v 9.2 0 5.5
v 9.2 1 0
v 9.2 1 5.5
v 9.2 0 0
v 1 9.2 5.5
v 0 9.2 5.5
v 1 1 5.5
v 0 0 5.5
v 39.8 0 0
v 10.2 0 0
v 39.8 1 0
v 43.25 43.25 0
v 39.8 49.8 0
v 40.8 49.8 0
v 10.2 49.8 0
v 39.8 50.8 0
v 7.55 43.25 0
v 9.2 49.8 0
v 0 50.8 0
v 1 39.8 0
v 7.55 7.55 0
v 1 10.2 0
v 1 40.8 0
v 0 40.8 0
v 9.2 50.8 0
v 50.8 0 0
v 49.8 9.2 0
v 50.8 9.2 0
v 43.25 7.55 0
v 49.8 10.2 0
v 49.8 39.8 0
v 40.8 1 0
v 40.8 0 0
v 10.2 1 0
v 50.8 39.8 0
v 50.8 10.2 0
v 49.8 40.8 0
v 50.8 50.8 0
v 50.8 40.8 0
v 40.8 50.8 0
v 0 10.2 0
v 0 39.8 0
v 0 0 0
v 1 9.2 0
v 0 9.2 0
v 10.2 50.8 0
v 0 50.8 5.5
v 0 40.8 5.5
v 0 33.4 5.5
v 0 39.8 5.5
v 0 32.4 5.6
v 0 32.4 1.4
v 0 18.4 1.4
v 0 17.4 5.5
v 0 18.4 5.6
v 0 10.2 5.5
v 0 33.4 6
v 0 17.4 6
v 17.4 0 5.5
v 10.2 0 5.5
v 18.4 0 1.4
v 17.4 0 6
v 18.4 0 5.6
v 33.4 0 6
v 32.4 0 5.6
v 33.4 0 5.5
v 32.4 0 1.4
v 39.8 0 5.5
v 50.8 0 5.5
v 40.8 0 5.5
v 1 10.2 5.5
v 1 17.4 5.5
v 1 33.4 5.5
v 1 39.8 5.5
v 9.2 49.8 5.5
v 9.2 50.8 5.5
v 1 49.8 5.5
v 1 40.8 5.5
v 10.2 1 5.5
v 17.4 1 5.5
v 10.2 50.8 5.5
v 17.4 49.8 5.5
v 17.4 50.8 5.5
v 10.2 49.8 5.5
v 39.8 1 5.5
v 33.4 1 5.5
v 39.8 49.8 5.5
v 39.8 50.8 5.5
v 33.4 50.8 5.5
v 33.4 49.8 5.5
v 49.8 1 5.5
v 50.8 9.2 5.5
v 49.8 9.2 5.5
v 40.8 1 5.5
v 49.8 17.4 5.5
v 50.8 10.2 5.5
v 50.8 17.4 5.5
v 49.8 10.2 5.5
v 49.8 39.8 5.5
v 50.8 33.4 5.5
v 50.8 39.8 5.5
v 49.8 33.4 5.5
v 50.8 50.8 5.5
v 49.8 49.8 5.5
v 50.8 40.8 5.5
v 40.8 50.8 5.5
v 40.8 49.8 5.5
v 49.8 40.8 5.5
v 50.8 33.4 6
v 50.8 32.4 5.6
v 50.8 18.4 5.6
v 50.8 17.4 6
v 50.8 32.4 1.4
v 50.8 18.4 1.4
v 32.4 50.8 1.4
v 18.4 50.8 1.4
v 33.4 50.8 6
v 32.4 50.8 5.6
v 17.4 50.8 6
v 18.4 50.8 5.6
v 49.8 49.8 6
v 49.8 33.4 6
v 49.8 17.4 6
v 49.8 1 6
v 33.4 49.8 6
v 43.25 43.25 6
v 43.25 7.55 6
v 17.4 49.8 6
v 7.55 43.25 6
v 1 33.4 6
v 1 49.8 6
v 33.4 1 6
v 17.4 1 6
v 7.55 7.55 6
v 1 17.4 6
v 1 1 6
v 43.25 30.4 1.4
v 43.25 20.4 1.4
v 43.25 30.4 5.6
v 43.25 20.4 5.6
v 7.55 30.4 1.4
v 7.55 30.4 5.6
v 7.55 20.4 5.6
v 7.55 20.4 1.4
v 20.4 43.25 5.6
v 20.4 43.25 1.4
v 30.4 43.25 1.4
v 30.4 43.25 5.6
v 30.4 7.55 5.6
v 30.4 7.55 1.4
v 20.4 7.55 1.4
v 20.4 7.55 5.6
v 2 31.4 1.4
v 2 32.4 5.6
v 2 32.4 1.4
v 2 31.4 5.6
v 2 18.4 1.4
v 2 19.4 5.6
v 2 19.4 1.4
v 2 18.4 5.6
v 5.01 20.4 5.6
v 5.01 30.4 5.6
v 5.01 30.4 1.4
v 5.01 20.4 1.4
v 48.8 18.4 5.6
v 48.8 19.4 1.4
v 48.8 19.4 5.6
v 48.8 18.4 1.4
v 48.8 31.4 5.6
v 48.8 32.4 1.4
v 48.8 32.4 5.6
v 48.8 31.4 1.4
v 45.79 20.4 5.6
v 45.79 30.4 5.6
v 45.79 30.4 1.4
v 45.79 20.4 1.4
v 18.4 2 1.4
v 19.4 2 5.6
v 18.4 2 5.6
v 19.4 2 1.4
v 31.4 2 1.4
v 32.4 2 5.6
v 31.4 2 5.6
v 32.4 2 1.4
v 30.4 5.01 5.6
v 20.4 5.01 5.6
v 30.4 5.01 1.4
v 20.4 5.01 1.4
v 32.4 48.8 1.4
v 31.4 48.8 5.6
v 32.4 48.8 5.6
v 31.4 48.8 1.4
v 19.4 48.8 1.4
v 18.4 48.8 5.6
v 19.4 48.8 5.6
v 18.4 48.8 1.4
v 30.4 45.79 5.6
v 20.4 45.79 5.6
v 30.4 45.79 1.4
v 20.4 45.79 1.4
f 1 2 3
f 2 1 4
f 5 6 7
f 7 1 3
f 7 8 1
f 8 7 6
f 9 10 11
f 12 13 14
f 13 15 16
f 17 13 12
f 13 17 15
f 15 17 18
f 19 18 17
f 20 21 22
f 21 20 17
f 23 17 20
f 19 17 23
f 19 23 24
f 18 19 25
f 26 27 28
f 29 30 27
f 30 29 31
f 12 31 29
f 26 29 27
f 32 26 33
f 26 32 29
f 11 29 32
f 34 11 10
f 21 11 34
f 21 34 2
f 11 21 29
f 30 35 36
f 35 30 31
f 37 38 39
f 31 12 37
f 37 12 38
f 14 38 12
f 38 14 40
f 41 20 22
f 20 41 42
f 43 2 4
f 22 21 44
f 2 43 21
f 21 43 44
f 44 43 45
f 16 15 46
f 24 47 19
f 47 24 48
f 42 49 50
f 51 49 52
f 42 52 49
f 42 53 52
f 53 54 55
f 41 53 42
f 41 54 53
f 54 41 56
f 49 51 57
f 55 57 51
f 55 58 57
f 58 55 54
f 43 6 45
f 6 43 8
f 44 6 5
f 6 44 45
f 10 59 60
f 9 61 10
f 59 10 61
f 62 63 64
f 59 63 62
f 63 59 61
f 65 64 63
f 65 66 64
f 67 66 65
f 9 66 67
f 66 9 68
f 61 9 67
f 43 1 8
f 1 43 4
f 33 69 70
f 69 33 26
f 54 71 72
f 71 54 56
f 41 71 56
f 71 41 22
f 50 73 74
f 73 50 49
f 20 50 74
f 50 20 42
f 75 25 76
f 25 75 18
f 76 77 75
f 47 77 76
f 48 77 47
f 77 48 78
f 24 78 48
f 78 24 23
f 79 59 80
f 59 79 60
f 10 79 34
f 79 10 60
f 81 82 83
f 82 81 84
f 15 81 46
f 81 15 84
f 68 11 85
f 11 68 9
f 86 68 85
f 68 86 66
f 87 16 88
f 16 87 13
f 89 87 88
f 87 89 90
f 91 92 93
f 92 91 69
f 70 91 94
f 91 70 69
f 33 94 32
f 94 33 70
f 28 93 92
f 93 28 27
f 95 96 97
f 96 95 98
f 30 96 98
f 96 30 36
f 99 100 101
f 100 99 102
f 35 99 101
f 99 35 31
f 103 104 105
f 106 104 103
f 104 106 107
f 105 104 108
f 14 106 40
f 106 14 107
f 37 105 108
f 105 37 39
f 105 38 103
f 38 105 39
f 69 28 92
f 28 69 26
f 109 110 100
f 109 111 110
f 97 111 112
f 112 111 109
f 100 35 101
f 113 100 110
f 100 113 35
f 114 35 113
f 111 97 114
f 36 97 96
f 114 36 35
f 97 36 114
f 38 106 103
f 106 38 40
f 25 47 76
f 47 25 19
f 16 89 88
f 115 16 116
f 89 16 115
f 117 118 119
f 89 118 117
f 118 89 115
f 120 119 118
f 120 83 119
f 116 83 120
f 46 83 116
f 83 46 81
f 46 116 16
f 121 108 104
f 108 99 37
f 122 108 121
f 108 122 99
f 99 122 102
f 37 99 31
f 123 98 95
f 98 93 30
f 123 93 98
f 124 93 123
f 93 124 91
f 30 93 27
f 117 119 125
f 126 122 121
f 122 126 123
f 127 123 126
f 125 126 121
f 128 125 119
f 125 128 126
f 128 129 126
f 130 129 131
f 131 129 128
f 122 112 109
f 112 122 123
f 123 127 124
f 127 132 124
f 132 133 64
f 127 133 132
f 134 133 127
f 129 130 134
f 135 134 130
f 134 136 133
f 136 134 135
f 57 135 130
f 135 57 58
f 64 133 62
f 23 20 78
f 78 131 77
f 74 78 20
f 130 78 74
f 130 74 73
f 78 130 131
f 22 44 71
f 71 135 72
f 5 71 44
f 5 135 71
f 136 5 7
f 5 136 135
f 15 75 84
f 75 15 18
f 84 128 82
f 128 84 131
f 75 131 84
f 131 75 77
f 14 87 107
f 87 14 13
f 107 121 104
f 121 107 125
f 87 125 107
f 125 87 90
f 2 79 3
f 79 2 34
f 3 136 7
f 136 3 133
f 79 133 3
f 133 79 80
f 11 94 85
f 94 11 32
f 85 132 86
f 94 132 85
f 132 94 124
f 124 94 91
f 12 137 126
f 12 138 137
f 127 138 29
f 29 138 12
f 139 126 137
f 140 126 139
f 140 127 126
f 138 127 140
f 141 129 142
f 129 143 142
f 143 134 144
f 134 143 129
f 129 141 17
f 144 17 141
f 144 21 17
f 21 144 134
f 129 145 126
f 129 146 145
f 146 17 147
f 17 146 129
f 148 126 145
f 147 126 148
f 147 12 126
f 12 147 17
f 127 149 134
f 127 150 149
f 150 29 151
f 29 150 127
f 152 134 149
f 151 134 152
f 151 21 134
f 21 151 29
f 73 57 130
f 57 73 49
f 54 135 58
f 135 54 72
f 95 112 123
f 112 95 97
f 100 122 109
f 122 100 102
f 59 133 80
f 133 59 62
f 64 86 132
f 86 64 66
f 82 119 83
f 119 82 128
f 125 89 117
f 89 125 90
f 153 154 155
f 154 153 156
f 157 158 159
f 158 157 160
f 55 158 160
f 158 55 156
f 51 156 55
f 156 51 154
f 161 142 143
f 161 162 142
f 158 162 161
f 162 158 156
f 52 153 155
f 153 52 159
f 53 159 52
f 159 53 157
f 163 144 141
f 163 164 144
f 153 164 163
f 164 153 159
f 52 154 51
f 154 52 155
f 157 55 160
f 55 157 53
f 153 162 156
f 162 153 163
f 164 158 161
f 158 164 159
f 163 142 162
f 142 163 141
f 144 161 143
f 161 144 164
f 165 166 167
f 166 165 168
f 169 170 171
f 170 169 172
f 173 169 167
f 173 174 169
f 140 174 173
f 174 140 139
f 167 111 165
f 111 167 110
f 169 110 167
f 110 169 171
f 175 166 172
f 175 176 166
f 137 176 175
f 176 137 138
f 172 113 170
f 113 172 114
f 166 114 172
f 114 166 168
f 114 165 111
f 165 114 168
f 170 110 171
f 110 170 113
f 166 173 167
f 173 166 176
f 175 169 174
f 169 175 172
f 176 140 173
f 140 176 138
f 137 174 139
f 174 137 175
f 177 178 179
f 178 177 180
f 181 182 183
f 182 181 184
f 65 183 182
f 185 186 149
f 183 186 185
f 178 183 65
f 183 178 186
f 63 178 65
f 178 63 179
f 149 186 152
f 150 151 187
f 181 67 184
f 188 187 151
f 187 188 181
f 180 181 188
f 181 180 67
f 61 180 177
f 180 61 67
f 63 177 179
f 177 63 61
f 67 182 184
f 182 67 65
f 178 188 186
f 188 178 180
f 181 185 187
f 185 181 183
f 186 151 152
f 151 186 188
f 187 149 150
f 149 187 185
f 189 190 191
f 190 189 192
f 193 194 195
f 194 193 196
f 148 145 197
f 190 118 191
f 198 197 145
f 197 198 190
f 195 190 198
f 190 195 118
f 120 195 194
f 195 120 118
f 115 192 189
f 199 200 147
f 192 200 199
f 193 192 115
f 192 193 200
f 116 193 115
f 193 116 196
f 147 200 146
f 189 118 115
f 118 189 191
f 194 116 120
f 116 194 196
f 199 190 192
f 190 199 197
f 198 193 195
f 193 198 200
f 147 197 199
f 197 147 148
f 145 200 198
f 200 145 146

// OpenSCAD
/* [Base Tile Size] */
x = 2; //[1,2,3,4,5,6]
y = 2; //[1,2,3,4,5,6]

/* [Square Basis] */
// What is the size in mm of a square?
square_basis = 25.4; // [25:Dwarven Forge/Hirstarts, 25.4:OpenLOCK, 31.75:Wyloch]

/* [Magnets] */
// Size of hole for magnet.  5.5 works well for 5mm buckyball style magnets.  0 to eliminate.
magnet_hole = 0;

/* [Priority] */
// Do you want openlock or magnets to win when the two conflict
priority = "openlock"; // [openlock,magnets]

/* [Style] */
// What should the base look like on the exterior
style = "stone"; // [stone,plain]

/*
 * Openlock connection bay
 */

module openlock_chamber(buffer=0) {
    translate([-buffer,-7,1.4]) cube([2+buffer,7*2,4.2]);
    hull() {
        translate([0,-6,1.4]) cube([2,6*2,4.2]);
        translate([3+0.01,-5,1.4]) cube([2,5*2,4.2]);
    }
    translate([5,-5,1.4]) cube([4,5*2,4.2]);
}

module openlock_supports(buffer=0) {
    translate([0-buffer*2,-0.5,1.4-buffer]) cube([10+buffer*2,1,4.2+buffer*2]);
}

module openlock_positive() {
    translate([0,-8,0]) cube([2,16,6]); 
}

module openlock_negative() {
    difference() {
        openlock_chamber(1);
        //openlock_supports(1);
    }
}

module magnet_positive(magnet_hole=5.5) {
    if (magnet_hole > 0) {
        translate([3.7,0,0]) cylinder(6,3.7,3.7, $fn=100);
    }
}

module magnet_negative(magnet_hole=5.5) {
    if (magnet_hole > 0) {
        translate([3.7,0,1]) cylinder(8,magnet_hole/2,magnet_hole/2, $fn=100);
        translate([3.7,0,-1]) cylinder(10,.9,.9,$fn=50);
    }
}



module center_connector_positive(edge, ordinal, magnet_hole=5.5, priority="openlock") {
    if (edge == 1) {
        if (priority == "openlock") {
            openlock_positive(magnet_hole);
        } else {
            magnet_positive(magnet_hole);
        }
    } else {
        magnet_positive(magnet_hole);
    }
}

module center_connector_negative(edge, ordinal, magnet_hole=5.5, priority="openlock") {
    if (edge == 1) {
        if (priority == "openlock") {
            openlock_negative(magnet_hole);
        } else {
            magnet_negative(magnet_hole);
        }
    } else {
        magnet_negative(magnet_hole);
    }
}

module joint_connector_positive(edge, ordinal, magnet_hole=5.5, priority="openlock") {
    if(ordinal % 2 != 0 || edge % 2 != 0) {
        openlock_positive();
    }
}

module joint_connector_negative(edge, ordinal, magnet_hole=5.5, priority="openlock") {
    if(ordinal % 2 != 0 || edge % 2 != 0) {
        openlock_negative();
    }
}

module openlock_base(x,y,square_basis,
        style="plain",magnet_hole=5.5,priority="openlock") {
    difference() {
        union() {
            translate([0,0,0]) difference() {
                if (style == "stone") {
                    stone_base(x,y,square_basis);
                } else if (style == "plain") {
                    plain_base(x,y,square_basis);
                }
                translate([6.55,6.55,0]) translate([1,1,-1]) cube([square_basis*x-15.1,square_basis*y-15.1,8]);
            }

            for ( i = [0 : y-1] ) {
                translate([0,square_basis*(i+1)-square_basis/2,0]) center_connector_positive(y,i,magnet_hole, priority);
                translate([square_basis*x,square_basis*(i+1)-square_basis/2,0]) rotate([0,0,180]) center_connector_positive(y,i,magnet_hole, priority);
            }
            if (y > 1) {
                for ( i = [1 : y-1] ) {
                    translate([0,square_basis*i,0]) joint_connector_positive(y,i,magnet_hole, priority);
                    translate([square_basis*x,square_basis*i,0]) rotate([0,0,180]) joint_connector_positive(y,i,magnet_hole, priority);
                }
            }
            for ( i = [0 : x-1] ) {
                translate([square_basis*(i+1)-square_basis/2,0,0]) rotate([0,0,90]) center_connector_positive(x,i,magnet_hole, priority);
                translate([square_basis*(i+1)-square_basis/2,square_basis*y,0]) rotate([0,0,-90]) center_connector_positive(x,i,magnet_hole, priority);
            }
            if (x > 1) {
                for ( i = [1 : x-1] ) {
                    translate([square_basis*i,0,0]) rotate([0,0,90]) joint_connector_positive(y,i,magnet_hole, priority);
                    translate([square_basis*i,square_basis*y,0]) rotate([0,0,-90]) joint_connector_positive(y,i,magnet_hole, priority);
                }
            }
        }
        
        for ( i = [0 : y-1] ) {
            translate([0,square_basis*(i+1)-square_basis/2,0]) center_connector_negative(y,i,magnet_hole, priority);
            translate([square_basis*x,square_basis*(i+1)-square_basis/2,0]) rotate([0,0,180]) center_connector_negative(y,i,magnet_hole, priority);
        }
        if (y > 1) {
            for ( i = [1 : y-1] ) {
                translate([0,square_basis*i,0]) joint_connector_negative(y,i,magnet_hole, priority);
                translate([square_basis*x,square_basis*i,0]) rotate([0,0,180]) joint_connector_negative(y,i,magnet_hole, priority);
            }
        }
        for ( i = [0 : x-1] ) {
            translate([square_basis*(i+1)-square_basis/2,0,0]) rotate([0,0,90]) center_connector_negative(x,i,magnet_hole, priority);
            translate([square_basis*(i+1)-square_basis/2,square_basis*y,0]) rotate([0,0,-90]) center_connector_negative(x,i,magnet_hole, priority);
        }
        if (x > 1) {
            for ( i = [1 : x-1] ) {
                translate([square_basis*i,0,0]) rotate([0,0,90]) joint_connector_negative(y,i,magnet_hole, priority);
                translate([square_basis*i,square_basis*y,0]) rotate([0,0,-90]) joint_connector_negative(y,i,magnet_hole, priority);
            }
        }
    }
}

module plain_base(x,y,square_basis) {
    translate([0,0,0]) cube([square_basis*x, square_basis*y, 6]);
}

module stone_base(x,y,square_basis) {
    length = square_basis*x;
    width = square_basis*y;
    xblocks = floor(length / 10.2);
    yblocks = floor(width / 10.2);
    
    intersection() {
        union() {
            for (i = [0:xblocks]) {
                for (j = [0:yblocks]) {
                    if (i == 0 || j == 0 || i == xblocks || j == yblocks) {
                        translate([i*10.2,j*10.2,0]) cube([9.2 + (i==xblocks ? 10.2 : 0),9.2 + (j==yblocks ? 10.2 : 0),5.5]);
                    }
                }
            }
        }
        cube([length, width, 6]);
    }
    translate([1,1,0]) cube([length-2, width-2, 6]);
}

color("Grey") openlock_base(x,y,square_basis,style=style,magnet_hole=magnet_hole,priority=priority);
